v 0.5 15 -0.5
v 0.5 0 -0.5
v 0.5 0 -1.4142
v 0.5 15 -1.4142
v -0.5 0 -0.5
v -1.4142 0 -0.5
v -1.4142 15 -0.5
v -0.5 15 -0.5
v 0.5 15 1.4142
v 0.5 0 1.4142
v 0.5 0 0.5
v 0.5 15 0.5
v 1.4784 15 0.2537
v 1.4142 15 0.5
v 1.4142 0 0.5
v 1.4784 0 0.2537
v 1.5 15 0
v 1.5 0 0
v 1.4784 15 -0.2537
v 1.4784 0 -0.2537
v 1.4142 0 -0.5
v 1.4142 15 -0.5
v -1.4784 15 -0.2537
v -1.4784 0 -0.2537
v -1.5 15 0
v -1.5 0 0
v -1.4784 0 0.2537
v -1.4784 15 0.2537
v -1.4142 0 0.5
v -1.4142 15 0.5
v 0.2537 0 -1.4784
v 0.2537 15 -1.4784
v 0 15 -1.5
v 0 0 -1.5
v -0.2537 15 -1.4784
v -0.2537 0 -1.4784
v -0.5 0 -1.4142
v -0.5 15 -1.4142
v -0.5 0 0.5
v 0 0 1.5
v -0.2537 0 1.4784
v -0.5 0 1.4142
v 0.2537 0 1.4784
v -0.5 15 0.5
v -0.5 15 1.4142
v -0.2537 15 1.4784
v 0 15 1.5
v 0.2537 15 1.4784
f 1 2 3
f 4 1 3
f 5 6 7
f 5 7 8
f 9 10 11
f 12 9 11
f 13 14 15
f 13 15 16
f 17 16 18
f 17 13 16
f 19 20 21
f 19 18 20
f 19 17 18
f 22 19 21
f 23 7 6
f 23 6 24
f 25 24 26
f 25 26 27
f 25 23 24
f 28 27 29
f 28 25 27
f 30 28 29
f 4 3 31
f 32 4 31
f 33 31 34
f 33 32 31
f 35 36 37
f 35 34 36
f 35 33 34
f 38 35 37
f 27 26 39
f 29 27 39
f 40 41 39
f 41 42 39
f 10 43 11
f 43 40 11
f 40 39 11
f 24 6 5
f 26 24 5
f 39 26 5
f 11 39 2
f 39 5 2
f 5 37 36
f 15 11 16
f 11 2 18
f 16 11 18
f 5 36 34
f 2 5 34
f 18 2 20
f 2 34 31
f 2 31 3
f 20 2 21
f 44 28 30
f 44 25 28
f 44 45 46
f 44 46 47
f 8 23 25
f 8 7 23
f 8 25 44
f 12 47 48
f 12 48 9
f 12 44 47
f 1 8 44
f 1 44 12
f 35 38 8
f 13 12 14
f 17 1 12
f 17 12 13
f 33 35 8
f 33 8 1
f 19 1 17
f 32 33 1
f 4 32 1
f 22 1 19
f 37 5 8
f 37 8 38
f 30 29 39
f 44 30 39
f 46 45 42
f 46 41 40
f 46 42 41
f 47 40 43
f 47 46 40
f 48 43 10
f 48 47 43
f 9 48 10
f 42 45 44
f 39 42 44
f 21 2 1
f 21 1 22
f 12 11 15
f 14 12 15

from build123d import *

# Parameters (mm, degrees)
SKETCH1_W           = 3
SKETCH1_H           = 1
SKETCH1_W_2         = 1
SKETCH1_H_2         = 3
BOSS_EXTRUDE1_DEPTH = 15
SKETCH2_OUTSIDE_W   = 8.118
SKETCH2_OUTSIDE_H   = 8.118
SKETCH2_OUTSIDE_R   = 1.5
CUT_EXTRUDE1_DEPTH  = 15


with BuildPart() as part:
    # Sketch1 → Boss-Extrude1 (new body)
    with BuildSketch(Plane(origin=(0, 0, 0), x_dir=(1, 0, 0), z_dir=(0, 1, 0))):
        Rectangle(SKETCH1_W, SKETCH1_H)
        Rectangle(SKETCH1_W_2, SKETCH1_H_2)
    extrude(amount=BOSS_EXTRUDE1_DEPTH)

    # Sketch2 outside → Cut-Extrude1 (cut)
    with BuildSketch(Plane(origin=(0, 15, 0), x_dir=(1, 0, 0), z_dir=(0, 1, 0))):
        Rectangle(SKETCH2_OUTSIDE_W, SKETCH2_OUTSIDE_H)
        Circle(SKETCH2_OUTSIDE_R, mode=Mode.SUBTRACT)
    extrude(amount=-CUT_EXTRUDE1_DEPTH, mode=Mode.SUBTRACT)


solid = part.part
